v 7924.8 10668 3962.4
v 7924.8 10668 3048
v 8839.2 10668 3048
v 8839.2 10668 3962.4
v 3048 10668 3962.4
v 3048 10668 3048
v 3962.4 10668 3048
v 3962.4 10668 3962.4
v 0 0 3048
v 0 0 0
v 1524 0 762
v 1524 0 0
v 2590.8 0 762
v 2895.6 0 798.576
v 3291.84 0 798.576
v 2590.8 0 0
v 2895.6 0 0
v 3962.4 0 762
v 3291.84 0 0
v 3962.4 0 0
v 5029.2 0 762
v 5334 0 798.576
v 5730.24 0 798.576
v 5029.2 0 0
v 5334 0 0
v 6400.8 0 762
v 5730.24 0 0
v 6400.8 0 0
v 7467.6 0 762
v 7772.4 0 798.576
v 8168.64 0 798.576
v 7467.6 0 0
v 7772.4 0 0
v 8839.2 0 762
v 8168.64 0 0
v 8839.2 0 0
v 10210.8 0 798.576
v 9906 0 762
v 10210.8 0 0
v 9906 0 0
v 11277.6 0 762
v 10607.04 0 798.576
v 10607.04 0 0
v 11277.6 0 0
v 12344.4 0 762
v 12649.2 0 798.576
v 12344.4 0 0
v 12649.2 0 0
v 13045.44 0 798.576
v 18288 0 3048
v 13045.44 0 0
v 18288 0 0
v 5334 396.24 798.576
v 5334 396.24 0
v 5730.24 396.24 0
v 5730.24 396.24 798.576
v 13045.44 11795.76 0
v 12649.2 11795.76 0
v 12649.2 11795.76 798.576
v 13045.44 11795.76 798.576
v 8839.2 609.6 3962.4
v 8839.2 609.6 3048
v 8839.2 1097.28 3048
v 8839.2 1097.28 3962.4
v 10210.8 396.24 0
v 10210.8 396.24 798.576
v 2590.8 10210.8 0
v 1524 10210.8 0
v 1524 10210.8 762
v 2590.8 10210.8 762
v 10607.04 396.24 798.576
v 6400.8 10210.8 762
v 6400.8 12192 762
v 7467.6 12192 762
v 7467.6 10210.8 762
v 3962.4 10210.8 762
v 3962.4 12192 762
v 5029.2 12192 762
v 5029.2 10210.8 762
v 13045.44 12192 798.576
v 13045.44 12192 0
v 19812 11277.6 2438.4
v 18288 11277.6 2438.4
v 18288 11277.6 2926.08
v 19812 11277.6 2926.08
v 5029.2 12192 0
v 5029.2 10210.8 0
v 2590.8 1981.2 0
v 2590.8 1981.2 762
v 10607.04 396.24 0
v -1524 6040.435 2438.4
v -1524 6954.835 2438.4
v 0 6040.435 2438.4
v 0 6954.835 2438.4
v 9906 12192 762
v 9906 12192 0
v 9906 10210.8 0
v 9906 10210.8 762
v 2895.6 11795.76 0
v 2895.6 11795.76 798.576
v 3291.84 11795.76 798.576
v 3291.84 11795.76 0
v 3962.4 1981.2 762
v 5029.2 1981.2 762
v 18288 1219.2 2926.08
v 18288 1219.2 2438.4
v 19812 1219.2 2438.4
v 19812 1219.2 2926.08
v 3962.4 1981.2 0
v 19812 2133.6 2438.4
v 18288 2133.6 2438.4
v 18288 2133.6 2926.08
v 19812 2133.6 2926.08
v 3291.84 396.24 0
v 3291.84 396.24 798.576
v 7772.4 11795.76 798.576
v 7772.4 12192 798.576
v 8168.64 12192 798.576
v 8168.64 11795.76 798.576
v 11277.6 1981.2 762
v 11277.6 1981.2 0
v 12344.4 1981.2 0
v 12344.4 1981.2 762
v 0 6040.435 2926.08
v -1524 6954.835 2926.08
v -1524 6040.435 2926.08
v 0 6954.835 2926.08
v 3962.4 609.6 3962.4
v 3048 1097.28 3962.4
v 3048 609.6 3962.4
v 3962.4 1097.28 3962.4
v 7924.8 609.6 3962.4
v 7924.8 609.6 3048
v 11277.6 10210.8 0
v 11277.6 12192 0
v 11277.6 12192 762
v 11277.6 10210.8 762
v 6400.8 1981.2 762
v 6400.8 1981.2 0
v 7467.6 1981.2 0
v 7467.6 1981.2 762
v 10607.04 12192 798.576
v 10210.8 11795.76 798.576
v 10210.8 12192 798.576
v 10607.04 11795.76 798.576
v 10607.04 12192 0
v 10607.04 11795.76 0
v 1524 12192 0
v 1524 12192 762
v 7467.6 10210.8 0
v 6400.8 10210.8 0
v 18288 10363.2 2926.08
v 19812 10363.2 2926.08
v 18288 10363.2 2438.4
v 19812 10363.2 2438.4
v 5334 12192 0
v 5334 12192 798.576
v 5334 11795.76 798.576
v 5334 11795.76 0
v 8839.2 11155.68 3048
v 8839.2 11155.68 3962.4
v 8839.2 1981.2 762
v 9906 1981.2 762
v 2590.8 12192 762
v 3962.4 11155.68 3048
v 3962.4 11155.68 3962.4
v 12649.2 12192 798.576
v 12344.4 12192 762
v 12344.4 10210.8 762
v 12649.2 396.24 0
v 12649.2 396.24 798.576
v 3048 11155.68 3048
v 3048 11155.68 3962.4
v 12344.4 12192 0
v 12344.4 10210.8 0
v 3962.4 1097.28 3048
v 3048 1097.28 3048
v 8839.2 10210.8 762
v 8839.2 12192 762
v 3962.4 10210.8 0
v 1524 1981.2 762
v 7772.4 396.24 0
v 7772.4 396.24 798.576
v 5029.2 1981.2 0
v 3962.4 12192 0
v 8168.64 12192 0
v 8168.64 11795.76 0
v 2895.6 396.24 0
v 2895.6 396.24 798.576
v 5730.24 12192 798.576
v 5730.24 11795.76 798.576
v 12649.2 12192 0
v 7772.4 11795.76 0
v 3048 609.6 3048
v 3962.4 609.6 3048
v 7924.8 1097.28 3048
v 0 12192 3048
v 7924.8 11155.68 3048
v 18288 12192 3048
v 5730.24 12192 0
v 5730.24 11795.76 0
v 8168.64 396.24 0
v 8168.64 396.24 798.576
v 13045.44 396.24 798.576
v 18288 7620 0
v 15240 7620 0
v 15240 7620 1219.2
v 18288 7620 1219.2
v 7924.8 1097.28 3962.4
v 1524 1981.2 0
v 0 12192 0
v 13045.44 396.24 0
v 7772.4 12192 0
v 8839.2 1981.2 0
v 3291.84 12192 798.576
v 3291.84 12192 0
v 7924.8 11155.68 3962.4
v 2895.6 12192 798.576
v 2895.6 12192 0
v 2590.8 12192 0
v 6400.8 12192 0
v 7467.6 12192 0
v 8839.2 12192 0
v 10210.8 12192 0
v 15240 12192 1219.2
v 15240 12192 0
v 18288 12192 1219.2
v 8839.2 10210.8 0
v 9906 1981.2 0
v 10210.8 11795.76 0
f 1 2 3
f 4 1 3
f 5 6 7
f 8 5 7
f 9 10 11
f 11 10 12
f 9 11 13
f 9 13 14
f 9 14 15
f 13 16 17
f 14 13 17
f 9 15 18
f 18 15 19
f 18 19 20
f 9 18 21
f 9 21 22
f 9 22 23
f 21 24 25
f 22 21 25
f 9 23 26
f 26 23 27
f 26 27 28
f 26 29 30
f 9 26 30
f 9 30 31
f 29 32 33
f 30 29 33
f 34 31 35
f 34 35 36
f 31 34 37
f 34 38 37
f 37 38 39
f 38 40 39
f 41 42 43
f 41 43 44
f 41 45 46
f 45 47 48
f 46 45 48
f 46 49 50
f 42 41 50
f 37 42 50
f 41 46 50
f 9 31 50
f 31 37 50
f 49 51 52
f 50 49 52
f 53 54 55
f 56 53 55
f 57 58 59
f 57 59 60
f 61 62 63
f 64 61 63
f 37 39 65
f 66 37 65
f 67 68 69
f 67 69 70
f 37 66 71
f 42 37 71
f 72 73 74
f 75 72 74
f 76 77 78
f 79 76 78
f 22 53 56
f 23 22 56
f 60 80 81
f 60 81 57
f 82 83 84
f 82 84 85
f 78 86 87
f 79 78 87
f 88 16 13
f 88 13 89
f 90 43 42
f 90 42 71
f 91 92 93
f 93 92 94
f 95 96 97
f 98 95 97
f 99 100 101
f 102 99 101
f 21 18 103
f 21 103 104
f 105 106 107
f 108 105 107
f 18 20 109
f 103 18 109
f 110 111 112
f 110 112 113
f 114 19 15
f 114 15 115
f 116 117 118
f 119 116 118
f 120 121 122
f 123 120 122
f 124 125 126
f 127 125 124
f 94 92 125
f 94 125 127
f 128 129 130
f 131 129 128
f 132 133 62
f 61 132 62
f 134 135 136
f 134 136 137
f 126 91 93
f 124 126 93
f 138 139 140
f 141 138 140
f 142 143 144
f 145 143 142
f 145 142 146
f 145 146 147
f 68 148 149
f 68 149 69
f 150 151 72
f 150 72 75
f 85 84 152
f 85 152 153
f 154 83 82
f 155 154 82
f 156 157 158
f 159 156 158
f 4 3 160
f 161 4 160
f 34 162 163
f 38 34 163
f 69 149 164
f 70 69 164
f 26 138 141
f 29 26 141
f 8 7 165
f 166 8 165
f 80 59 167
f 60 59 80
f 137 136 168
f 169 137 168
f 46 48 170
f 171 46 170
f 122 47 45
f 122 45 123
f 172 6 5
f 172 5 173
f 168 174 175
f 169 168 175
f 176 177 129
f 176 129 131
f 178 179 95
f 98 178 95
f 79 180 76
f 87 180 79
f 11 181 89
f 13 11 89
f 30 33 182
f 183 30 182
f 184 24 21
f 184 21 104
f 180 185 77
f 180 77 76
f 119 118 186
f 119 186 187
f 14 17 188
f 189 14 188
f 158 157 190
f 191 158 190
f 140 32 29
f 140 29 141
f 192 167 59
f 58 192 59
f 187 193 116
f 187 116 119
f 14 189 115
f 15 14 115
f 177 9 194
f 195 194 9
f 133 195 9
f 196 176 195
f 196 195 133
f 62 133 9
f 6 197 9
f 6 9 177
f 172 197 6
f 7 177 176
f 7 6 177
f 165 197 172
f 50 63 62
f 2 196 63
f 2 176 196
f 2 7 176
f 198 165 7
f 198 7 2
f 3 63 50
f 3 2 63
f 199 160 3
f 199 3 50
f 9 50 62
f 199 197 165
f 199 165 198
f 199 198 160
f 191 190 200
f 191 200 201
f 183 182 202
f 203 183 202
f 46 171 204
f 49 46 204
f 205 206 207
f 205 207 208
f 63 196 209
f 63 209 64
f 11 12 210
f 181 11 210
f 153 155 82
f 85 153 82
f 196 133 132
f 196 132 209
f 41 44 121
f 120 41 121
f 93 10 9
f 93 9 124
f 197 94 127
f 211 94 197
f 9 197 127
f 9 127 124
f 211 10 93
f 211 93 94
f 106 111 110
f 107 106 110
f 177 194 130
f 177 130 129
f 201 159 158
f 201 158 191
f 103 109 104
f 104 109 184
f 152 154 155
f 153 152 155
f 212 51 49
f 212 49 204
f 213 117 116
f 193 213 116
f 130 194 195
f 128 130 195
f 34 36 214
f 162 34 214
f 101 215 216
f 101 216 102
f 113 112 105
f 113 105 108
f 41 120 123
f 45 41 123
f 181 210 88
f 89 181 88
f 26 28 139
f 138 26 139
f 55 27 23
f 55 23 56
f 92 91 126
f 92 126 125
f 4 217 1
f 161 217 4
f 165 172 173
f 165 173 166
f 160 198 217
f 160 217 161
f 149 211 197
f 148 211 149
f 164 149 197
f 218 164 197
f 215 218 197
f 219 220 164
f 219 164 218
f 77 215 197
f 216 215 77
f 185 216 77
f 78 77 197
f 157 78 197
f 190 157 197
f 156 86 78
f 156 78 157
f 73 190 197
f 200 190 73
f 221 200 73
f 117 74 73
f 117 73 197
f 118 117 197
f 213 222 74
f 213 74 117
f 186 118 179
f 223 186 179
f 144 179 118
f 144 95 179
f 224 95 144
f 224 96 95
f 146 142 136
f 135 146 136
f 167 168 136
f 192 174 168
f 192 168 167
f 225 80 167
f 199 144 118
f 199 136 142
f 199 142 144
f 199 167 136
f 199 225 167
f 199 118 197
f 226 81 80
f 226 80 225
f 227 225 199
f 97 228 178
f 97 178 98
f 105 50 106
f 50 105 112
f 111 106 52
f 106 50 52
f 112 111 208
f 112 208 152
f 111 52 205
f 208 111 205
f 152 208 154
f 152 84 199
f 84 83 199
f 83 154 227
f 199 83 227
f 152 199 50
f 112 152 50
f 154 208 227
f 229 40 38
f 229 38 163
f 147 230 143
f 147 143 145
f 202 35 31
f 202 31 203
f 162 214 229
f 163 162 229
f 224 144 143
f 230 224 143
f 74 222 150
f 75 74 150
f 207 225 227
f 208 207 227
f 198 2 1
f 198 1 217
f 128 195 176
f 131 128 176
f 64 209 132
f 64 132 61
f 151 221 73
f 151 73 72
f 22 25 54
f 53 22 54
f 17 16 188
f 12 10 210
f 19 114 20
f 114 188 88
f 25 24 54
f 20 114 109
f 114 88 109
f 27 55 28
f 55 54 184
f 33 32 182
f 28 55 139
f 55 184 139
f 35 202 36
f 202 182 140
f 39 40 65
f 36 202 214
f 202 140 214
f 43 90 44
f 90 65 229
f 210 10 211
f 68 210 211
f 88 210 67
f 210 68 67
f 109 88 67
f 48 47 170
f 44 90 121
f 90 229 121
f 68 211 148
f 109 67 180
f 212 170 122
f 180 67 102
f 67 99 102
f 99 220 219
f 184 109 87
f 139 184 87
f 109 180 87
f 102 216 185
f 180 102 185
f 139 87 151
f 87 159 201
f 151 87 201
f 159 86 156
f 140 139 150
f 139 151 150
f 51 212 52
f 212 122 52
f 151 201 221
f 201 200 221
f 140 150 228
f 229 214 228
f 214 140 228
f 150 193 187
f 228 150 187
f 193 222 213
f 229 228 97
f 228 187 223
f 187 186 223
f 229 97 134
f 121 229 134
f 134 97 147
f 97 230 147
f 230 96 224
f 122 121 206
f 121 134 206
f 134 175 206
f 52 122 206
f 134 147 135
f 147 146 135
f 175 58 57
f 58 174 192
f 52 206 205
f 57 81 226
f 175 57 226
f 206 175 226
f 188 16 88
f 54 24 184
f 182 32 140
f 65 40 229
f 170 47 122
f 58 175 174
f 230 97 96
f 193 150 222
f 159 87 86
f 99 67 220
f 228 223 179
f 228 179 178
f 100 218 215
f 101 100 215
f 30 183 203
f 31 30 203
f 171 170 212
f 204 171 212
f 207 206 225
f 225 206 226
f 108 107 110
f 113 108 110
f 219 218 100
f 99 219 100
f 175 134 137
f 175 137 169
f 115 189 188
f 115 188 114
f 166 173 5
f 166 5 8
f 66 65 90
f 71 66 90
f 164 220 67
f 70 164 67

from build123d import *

# Parameters (mm, degrees)
BOX011_W     = 3048
BOX011_H     = 4572
BOX011_DEPTH = 1219.2
BOX006_W     = 1066.8
BOX006_H     = 1981.2
BOX006_DEPTH = 762
BOX005_W     = 396.24
BOX005_H     = 396.24
BOX005_DEPTH = 798.576
BOX007_W     = 1066.8
BOX007_H     = 1981.2
BOX007_DEPTH = 762
BOX008_W     = 396.24
BOX008_H     = 396.24
BOX008_DEPTH = 798.576
BOX010_W     = 1066.8
BOX010_H     = 1981.2
BOX010_DEPTH = 762
BOX009_W     = 396.24
BOX009_H     = 396.24
BOX009_DEPTH = 798.576
BOX001_W     = 1066.8
BOX001_H     = 1981.2
BOX001_DEPTH = 762
BOX002_W     = 396.24
BOX002_H     = 396.24
BOX002_DEPTH = 798.576
BOX003_W     = 1066.8
BOX003_H     = 1981.2
BOX003_DEPTH = 762
BOX004_W     = 396.24
BOX004_H     = 396.24
BOX004_DEPTH = 798.576
BOX017_W     = 914.4
BOX017_H     = 487.68
BOX017_DEPTH = 1219.2
BOX018_W     = 914.4
BOX018_H     = 487.68
BOX018_DEPTH = 1219.2
BOX019_W     = 914.4
BOX019_H     = 487.68
BOX019_DEPTH = 1219.2
BOX016_W     = 914.4
BOX016_H     = 487.68
BOX016_DEPTH = 1219.2
BOX012_W     = 2438.4
BOX012_H     = 914.4
BOX012_DEPTH = 487.68
BOX013_W     = 2438.4
BOX013_H     = 914.4
BOX013_DEPTH = 487.68
BOX020_W     = 2438.4
BOX020_H     = 914.4
BOX020_DEPTH = 487.68
BOX_W        = 18288
BOX_H        = 12192
BOX_DEPTH    = 3048


with BuildPart() as nurse_station:
    # Box011 → Box011 (new body)
    with BuildSketch(Plane(origin=(15240, 7620, 0), x_dir=(1, 0, 0), z_dir=(0, 0, 1))):
        with Locations((1524, 2286)):
            Rectangle(BOX011_W, BOX011_H)
    extrude(amount=BOX011_DEPTH)


with BuildPart() as box006:
    # Box006 → Box006 (new body)
    with BuildSketch(Plane.XY):
        with Locations((533.4, 990.6)):
            Rectangle(BOX006_W, BOX006_H)
    extrude(amount=BOX006_DEPTH)


with BuildPart() as fusion002:
    # Box005 → Box005 (new body)
    with BuildSketch(Plane(origin=(1371.6, 0, 0), x_dir=(1, 0, 0), z_dir=(0, 0, 1))):
        with Locations((198.12, 198.12)):
            Rectangle(BOX005_W, BOX005_H)
    extrude(amount=BOX005_DEPTH)

    # Fusion002: union Box006
    add(box006.part)


with BuildPart() as fusion002_1:
    # Fusion002 placement: moved
    add(fusion002.part.moved(Location((4876.8, 0, 0))))


with BuildPart() as box007:
    # Box007 → Box007 (new body)
    with BuildSketch(Plane.XY):
        with Locations((533.4, 990.6)):
            Rectangle(BOX007_W, BOX007_H)
    extrude(amount=BOX007_DEPTH)


with BuildPart() as fusion003:
    # Box008 → Box008 (new body)
    with BuildSketch(Plane(origin=(1371.6, 0, 0), x_dir=(1, 0, 0), z_dir=(0, 0, 1))):
        with Locations((198.12, 198.12)):
            Rectangle(BOX008_W, BOX008_H)
    extrude(amount=BOX008_DEPTH)

    # Fusion003: union Box007
    add(box007.part)


with BuildPart() as fusion003_1:
    # Fusion003 placement: moved
    add(fusion003.part.moved(Location((7315.2, 0, 0))))


with BuildPart() as box010:
    # Box010 → Box010 (new body)
    with BuildSketch(Plane.XY):
        with Locations((533.4, 990.6)):
            Rectangle(BOX010_W, BOX010_H)
    extrude(amount=BOX010_DEPTH)


with BuildPart() as fusion004:
    # Box009 → Box009 (new body)
    with BuildSketch(Plane(origin=(1371.6, 0, 0), x_dir=(1, 0, 0), z_dir=(0, 0, 1))):
        with Locations((198.12, 198.12)):
            Rectangle(BOX009_W, BOX009_H)
    extrude(amount=BOX009_DEPTH)

    # Fusion004: union Box010
    add(box010.part)


with BuildPart() as fusion004_1:
    # Fusion004 placement: moved
    add(fusion004.part.moved(Location((9753.6, 0, 0))))


with BuildPart() as box001:
    # Box001 → Box001 (new body)
    with BuildSketch(Plane.XY):
        with Locations((533.4, 990.6)):
            Rectangle(BOX001_W, BOX001_H)
    extrude(amount=BOX001_DEPTH)


with BuildPart() as fusion:
    # Box002 → Box002 (new body)
    with BuildSketch(Plane(origin=(1371.6, 0, 0), x_dir=(1, 0, 0), z_dir=(0, 0, 1))):
        with Locations((198.12, 198.12)):
            Rectangle(BOX002_W, BOX002_H)
    extrude(amount=BOX002_DEPTH)

    # Fusion: union Box001
    add(box001.part)


with BuildPart() as box003:
    # Box003 → Box003 (new body)
    with BuildSketch(Plane.XY):
        with Locations((533.4, 990.6)):
            Rectangle(BOX003_W, BOX003_H)
    extrude(amount=BOX003_DEPTH)


with BuildPart() as right_beds:
    # Box004 → Box004 (new body)
    with BuildSketch(Plane(origin=(1371.6, 0, 0), x_dir=(1, 0, 0), z_dir=(0, 0, 1))):
        with Locations((198.12, 198.12)):
            Rectangle(BOX004_W, BOX004_H)
    extrude(amount=BOX004_DEPTH)

    # Fusion001: union Box003
    add(box003.part)


with BuildPart() as right_beds_1:
    # Fusion001 placement: moved
    add(right_beds.part.moved(Location((2438.4, 0, 0))))

    # Fusion005: union Fusion002, Fusion003, Fusion004, Fusion
    add(fusion002_1.part)
    add(fusion003_1.part)
    add(fusion004_1.part)
    add(fusion.part)


with BuildPart() as surfaces:
    # Part__Mirroring: instance of right beds
    add(right_beds_1.part.mirror(Plane(origin=(0, 6096, 0), x_dir=(1, 0, 0), z_dir=(0, 1, 0))))

    # Fusion006: union right beds
    add(right_beds_1.part)


with BuildPart() as surfaces_1:
    # Fusion006 placement: moved
    add(surfaces.part.moved(Location((1524, 0, 0))))

    # Fusion010: union Nurse Station
    add(nurse_station.part)


with BuildPart() as branch003:
    # Box017 → Box017 (new body)
    with BuildSketch(Plane(origin=(7924.8, 10668, 2743.2), x_dir=(1, 0, 0), z_dir=(0, 0, 1))):
        with Locations((457.2, 243.84)):
            Rectangle(BOX017_W, BOX017_H)
    extrude(amount=BOX017_DEPTH)


with BuildPart() as branch004:
    # Box018 → Box018 (new body)
    with BuildSketch(Plane(origin=(3048, 609.6, 2743.2), x_dir=(1, 0, 0), z_dir=(0, 0, 1))):
        with Locations((457.2, 243.84)):
            Rectangle(BOX018_W, BOX018_H)
    extrude(amount=BOX018_DEPTH)


with BuildPart() as branch005:
    # Box019 → Box019 (new body)
    with BuildSketch(Plane(origin=(3048, 10668, 2743.2), x_dir=(1, 0, 0), z_dir=(0, 0, 1))):
        with Locations((457.2, 243.84)):
            Rectangle(BOX019_W, BOX019_H)
    extrude(amount=BOX019_DEPTH)


with BuildPart() as branch_ducts:
    # Box016 → Box016 (new body)
    with BuildSketch(Plane(origin=(7924.8, 609.6, 2743.2), x_dir=(1, 0, 0), z_dir=(0, 0, 1))):
        with Locations((457.2, 243.84)):
            Rectangle(BOX016_W, BOX016_H)
    extrude(amount=BOX016_DEPTH)

    # Fusion011: union branch003, branch004, branch005
    add(branch003.part)
    add(branch004.part)
    add(branch005.part)


with BuildPart() as main_inlet:
    # Box012 → Box012 (new body)
    with BuildSketch(Plane(origin=(17373.6, 1219.2, 2438.4), x_dir=(1, 0, 0), z_dir=(0, 0, 1))):
        with Locations((1219.2, 457.2)):
            Rectangle(BOX012_W, BOX012_H)
    extrude(amount=BOX012_DEPTH)


with BuildPart() as main_outlet:
    # Box013 → Box013 (new body)
    with BuildSketch(Plane(origin=(-1524, 6040.43496, 2438.4), x_dir=(1, 0, 0), z_dir=(0, 0, 1))):
        with Locations((1219.2, 457.2)):
            Rectangle(BOX013_W, BOX013_H)
    extrude(amount=BOX013_DEPTH)


with BuildPart() as fusion013:
    # Box020 → Box020 (new body)
    with BuildSketch(Plane(origin=(17373.6, 10363.2, 2438.4), x_dir=(1, 0, 0), z_dir=(0, 0, 1))):
        with Locations((1219.2, 457.2)):
            Rectangle(BOX020_W, BOX020_H)
    extrude(amount=BOX020_DEPTH)

    # Fusion012: union main inlet, main outlet
    add(main_inlet.part)
    add(main_outlet.part)

    # Fusion013: union branch_ducts
    add(branch_ducts.part)


with BuildPart() as cut:
    # Box → Box (new body)
    with BuildSketch(Plane.XY):
        with Locations((9144, 6096)):
            Rectangle(BOX_W, BOX_H)
    extrude(amount=BOX_DEPTH)

    # Fusion014: union Fusion013
    add(fusion013.part)

    # Cut: cut surfaces
    add(surfaces_1.part, mode=Mode.SUBTRACT)


solid = cut.part
